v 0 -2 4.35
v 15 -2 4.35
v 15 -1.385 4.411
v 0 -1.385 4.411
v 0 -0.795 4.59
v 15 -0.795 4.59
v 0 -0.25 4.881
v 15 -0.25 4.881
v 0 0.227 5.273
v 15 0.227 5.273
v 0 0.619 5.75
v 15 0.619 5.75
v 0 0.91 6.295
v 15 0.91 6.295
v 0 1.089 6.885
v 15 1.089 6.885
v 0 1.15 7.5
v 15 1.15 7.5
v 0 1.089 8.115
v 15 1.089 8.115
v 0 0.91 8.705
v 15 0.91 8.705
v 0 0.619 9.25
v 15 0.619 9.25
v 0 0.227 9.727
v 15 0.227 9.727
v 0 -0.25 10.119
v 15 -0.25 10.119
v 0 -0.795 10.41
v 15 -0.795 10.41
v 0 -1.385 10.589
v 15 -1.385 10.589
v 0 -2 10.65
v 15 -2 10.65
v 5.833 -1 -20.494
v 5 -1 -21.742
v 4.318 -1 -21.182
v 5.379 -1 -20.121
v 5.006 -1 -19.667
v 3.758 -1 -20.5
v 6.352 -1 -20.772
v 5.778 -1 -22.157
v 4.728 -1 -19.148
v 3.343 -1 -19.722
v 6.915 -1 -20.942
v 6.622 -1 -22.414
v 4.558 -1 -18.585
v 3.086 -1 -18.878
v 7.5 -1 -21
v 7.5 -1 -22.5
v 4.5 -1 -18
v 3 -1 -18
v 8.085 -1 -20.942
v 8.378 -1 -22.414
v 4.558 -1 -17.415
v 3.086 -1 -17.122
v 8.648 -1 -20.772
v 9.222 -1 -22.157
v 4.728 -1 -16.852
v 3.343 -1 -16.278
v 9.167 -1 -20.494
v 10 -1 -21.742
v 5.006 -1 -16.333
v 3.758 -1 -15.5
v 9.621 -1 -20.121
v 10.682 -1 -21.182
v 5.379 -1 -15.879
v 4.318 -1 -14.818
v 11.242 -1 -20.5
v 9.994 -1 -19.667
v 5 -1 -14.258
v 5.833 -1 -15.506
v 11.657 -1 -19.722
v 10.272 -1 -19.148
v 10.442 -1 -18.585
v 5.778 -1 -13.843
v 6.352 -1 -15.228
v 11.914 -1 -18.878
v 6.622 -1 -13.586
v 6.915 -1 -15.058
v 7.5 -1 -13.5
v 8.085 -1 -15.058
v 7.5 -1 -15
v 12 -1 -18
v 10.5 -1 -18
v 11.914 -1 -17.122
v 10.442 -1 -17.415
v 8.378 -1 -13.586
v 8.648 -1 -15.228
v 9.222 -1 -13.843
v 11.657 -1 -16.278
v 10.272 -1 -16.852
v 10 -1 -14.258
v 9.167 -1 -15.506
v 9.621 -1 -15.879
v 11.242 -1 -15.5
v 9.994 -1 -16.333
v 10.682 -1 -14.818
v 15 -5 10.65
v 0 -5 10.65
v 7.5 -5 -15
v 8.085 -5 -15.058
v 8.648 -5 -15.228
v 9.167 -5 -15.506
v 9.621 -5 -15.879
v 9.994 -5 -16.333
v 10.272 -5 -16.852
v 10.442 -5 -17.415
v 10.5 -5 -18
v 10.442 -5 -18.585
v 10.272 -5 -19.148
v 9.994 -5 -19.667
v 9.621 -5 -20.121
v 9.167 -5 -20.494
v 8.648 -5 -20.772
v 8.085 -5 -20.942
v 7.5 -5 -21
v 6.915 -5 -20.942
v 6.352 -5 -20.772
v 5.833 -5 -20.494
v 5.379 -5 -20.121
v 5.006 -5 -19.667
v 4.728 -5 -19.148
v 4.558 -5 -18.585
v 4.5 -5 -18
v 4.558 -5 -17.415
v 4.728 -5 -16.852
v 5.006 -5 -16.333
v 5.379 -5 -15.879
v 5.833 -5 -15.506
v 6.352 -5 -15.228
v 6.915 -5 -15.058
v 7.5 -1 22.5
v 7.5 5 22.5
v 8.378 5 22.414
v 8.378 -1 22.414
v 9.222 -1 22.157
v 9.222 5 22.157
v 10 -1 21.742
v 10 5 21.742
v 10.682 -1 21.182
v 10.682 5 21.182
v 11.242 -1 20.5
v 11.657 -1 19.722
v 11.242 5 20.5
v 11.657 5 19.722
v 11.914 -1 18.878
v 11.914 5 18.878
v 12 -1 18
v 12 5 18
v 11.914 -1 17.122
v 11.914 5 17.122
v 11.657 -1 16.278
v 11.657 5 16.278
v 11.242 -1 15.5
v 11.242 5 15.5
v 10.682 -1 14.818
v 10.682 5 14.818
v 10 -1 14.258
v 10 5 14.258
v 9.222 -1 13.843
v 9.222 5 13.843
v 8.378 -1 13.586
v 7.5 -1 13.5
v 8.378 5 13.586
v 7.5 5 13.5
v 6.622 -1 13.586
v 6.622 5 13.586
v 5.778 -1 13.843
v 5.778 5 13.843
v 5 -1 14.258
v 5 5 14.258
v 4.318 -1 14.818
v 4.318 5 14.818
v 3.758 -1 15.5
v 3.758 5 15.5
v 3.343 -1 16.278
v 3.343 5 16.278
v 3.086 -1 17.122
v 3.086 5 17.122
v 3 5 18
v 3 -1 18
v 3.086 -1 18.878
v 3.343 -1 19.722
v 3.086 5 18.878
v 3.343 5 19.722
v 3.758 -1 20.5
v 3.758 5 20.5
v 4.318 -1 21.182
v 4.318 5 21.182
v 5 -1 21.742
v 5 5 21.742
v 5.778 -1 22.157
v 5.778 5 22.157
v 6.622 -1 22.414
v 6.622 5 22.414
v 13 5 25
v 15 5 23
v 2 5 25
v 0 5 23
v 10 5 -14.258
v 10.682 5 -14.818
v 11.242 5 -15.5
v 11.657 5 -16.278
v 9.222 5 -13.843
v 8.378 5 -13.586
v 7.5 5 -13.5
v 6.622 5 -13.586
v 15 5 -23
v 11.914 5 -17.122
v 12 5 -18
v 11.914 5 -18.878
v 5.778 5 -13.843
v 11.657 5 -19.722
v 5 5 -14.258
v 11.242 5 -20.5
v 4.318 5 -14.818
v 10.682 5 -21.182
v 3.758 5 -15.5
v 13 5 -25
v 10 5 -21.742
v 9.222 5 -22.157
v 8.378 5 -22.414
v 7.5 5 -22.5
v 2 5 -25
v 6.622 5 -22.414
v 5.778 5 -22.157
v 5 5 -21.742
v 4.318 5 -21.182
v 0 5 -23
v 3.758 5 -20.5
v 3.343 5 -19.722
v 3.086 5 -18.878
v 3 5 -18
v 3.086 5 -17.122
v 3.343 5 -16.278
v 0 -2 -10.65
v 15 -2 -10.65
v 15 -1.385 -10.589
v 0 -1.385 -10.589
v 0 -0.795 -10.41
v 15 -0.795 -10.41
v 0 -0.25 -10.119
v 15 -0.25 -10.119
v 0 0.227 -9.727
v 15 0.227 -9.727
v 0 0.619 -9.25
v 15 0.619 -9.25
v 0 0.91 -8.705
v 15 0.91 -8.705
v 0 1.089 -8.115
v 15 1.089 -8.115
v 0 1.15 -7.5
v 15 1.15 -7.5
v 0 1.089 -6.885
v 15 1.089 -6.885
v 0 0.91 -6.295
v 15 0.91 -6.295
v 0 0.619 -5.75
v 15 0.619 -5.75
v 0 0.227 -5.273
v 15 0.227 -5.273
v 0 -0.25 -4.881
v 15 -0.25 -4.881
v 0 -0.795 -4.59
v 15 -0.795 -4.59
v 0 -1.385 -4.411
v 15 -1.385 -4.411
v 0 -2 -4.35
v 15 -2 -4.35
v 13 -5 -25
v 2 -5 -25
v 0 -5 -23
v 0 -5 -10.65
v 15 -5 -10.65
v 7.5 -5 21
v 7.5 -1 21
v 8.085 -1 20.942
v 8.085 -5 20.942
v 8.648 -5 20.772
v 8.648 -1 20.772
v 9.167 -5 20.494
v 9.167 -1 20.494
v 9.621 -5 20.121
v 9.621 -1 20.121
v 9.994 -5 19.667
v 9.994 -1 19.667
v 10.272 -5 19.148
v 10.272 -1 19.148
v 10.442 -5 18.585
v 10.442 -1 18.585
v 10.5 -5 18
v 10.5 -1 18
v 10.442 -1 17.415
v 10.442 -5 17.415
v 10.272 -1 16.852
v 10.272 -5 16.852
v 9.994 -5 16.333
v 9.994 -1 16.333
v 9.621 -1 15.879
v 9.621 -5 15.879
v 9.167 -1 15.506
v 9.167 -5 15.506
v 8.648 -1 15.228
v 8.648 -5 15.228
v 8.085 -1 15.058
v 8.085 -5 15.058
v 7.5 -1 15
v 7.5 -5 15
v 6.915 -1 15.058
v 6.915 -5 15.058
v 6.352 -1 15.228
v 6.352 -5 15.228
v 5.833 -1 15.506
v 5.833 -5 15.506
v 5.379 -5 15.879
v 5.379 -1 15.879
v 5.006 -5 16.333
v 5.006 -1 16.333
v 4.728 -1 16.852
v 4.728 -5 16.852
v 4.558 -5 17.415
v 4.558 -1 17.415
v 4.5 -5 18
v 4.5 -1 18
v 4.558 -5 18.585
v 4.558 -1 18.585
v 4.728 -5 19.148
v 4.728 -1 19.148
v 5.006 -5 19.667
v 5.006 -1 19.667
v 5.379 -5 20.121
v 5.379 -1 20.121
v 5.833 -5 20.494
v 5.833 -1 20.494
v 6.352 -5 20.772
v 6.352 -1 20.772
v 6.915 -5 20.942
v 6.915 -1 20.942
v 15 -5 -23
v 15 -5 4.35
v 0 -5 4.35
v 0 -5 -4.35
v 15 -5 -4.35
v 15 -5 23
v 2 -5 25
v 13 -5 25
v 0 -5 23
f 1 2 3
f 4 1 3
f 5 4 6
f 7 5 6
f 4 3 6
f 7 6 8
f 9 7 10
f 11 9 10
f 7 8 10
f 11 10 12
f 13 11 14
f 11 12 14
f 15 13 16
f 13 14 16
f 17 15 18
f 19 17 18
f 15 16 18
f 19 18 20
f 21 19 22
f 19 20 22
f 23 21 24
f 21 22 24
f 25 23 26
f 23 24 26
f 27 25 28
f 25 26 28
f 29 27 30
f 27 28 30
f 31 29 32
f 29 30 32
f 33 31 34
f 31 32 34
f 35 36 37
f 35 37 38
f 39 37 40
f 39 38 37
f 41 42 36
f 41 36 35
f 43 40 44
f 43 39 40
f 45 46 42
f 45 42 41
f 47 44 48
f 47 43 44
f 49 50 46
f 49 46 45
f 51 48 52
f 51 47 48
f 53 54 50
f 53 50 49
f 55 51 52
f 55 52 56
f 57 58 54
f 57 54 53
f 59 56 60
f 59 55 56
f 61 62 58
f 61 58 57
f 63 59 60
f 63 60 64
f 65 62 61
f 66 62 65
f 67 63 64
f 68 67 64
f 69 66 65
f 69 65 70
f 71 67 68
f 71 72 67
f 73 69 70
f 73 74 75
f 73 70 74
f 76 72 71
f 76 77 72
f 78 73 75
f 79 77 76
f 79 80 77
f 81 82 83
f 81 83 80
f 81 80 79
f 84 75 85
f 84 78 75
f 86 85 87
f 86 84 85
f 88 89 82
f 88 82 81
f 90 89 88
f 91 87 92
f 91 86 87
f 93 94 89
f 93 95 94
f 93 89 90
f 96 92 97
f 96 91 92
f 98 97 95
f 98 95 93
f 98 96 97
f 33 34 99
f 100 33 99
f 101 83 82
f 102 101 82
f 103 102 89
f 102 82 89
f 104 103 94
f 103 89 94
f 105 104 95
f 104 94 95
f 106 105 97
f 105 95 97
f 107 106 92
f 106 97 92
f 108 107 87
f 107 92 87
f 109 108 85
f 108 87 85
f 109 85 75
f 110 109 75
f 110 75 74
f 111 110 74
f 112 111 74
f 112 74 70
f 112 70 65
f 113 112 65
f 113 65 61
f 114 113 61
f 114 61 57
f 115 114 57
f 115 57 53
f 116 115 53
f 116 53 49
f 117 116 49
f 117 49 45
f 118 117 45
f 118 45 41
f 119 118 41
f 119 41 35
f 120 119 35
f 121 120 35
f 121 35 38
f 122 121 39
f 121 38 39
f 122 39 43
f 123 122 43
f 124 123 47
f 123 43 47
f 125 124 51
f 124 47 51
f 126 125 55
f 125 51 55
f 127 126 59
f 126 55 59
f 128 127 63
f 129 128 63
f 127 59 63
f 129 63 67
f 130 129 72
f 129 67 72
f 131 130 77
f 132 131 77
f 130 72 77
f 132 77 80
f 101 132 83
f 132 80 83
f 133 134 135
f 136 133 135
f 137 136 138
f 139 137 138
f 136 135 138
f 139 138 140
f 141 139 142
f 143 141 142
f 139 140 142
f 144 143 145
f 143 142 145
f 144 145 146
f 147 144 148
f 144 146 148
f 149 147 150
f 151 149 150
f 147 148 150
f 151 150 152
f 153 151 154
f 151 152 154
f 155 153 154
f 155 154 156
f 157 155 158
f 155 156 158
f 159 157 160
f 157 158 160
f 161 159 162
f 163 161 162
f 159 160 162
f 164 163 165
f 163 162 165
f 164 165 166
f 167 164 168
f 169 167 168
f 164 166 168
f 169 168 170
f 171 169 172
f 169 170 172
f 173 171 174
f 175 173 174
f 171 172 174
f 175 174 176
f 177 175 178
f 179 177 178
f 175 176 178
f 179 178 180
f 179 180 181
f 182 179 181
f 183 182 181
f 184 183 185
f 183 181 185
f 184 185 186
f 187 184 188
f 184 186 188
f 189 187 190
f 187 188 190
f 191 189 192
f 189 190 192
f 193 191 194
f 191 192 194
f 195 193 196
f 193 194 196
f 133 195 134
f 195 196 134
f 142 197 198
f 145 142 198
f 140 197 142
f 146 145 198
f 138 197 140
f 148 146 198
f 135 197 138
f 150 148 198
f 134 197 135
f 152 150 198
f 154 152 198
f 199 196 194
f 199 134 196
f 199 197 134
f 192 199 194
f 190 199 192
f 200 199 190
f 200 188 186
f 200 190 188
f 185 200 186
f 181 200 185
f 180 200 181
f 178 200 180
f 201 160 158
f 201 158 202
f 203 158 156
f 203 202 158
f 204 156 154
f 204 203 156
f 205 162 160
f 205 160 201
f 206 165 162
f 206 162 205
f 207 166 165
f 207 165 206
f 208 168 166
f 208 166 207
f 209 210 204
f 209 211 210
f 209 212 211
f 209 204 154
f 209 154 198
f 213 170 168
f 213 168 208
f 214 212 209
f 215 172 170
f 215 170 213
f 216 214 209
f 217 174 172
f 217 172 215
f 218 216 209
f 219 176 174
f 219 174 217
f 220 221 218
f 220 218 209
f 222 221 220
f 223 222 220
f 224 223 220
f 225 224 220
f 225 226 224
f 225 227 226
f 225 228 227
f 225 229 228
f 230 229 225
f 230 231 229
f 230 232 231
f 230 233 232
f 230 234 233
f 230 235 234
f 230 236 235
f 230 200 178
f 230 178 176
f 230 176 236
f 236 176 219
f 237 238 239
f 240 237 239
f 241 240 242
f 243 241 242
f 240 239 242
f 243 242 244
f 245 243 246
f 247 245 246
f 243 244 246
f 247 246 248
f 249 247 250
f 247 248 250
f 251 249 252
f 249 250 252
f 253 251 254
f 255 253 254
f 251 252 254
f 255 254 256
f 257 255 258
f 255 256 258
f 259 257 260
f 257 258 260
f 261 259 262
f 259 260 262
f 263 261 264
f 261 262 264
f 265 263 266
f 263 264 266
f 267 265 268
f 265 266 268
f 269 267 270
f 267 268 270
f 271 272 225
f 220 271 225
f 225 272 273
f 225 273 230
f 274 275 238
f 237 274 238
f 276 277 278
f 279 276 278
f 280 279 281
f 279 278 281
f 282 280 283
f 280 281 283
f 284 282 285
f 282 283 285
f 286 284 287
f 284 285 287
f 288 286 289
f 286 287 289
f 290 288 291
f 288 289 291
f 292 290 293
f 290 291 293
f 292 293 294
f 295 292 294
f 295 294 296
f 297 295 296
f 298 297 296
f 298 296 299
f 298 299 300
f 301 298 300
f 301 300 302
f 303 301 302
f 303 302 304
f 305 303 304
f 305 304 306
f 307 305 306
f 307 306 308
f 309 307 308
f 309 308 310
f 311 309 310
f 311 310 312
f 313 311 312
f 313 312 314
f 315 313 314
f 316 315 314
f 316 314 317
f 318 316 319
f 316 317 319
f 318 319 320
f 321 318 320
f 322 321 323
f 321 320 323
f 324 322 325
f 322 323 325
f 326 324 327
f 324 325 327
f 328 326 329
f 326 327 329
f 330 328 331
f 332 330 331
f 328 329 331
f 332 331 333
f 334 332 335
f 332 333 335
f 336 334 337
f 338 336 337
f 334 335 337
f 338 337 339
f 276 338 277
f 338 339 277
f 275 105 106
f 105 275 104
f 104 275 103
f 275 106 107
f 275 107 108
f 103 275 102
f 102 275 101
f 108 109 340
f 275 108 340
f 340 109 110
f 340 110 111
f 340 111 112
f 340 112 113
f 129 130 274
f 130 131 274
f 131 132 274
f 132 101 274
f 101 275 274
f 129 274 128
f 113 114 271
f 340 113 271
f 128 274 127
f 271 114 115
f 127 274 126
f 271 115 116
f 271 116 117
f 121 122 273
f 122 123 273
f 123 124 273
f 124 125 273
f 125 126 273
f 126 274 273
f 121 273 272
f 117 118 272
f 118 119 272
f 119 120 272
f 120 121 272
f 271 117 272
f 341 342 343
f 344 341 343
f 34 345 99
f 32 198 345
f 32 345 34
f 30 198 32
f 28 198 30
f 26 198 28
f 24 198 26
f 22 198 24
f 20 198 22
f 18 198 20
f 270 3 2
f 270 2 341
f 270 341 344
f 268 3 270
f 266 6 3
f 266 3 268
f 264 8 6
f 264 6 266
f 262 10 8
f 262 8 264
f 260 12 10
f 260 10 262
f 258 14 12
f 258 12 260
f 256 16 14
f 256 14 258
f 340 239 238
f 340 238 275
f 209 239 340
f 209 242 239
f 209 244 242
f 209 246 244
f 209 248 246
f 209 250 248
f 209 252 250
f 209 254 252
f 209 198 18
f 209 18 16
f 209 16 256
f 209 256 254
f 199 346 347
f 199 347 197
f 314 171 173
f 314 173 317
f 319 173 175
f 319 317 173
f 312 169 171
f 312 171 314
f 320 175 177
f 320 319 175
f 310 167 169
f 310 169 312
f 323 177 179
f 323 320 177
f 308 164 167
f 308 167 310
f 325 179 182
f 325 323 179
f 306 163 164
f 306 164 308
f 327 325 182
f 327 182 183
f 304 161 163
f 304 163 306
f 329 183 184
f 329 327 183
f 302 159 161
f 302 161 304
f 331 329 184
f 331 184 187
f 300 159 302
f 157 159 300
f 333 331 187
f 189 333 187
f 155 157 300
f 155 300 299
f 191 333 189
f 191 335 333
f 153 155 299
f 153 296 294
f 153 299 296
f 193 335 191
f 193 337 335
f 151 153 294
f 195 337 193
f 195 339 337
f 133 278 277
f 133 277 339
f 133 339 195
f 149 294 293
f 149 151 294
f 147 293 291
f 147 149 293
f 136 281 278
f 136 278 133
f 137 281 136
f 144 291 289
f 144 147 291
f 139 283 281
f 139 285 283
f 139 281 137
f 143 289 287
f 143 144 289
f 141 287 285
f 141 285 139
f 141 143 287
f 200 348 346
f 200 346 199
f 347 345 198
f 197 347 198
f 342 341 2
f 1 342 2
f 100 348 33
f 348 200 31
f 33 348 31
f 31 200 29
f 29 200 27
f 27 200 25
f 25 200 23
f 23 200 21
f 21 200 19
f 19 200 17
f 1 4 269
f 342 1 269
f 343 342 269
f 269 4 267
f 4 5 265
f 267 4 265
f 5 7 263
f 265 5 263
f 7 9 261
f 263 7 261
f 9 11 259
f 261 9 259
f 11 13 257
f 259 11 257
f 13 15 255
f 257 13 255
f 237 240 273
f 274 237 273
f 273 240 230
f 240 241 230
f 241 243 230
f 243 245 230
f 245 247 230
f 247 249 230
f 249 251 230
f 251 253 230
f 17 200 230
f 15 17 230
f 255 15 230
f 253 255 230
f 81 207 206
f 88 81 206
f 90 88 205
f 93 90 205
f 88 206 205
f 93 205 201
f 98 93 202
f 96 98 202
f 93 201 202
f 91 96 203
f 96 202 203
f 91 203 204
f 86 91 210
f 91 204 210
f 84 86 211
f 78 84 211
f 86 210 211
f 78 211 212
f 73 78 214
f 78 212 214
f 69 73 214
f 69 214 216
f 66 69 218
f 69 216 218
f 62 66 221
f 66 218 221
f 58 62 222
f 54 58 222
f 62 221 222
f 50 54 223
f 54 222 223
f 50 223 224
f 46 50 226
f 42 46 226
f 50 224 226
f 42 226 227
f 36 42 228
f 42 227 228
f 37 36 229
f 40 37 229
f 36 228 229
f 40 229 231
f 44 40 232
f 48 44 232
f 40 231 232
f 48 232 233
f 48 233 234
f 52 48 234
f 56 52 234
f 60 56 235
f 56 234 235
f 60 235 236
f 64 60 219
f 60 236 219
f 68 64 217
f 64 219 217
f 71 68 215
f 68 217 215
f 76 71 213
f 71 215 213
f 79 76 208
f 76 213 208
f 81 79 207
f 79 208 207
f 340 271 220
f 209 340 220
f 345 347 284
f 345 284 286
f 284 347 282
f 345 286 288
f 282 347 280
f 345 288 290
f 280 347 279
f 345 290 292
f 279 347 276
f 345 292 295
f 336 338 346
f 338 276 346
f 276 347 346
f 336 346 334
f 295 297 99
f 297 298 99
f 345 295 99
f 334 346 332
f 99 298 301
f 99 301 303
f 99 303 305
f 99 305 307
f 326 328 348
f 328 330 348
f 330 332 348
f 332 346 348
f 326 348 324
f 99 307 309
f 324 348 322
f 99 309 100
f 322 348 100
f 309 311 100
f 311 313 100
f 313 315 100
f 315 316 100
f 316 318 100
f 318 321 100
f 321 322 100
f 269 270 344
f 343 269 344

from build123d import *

# Parameters (mm, degrees)
SKETCH1_W           = 50
SKETCH1_H           = 10
BOSS_EXTRUDE1_DEPTH = 15
SKETCH3_R           = 4.5
CUT_EXTRUDE1_DEPTH  = 6
SKETCH4_R           = 3
CUT_EXTRUDE2_DEPTH  = 6
CUT_EXTRUDE3_DEPTH  = 30.580398915
CHAMFER1_SIZE       = 2


with BuildPart() as part:
    # Sketch1 → Boss-Extrude1 (new body)
    with BuildSketch(Plane(origin=(0, 0, 0), x_dir=(0, 0, -1), z_dir=(1, 0, 0))):
        Rectangle(SKETCH1_W, SKETCH1_H)
    extrude(amount=BOSS_EXTRUDE1_DEPTH)

    # Sketch3 → Cut-Extrude1 (cut)
    with BuildSketch(Plane(origin=(0, 5, 0), x_dir=(1, 0, 0), z_dir=(0, 1, 0))):
        with Locations(Location((7.5, -18, 0), (0, 0, 270))):
            Circle(SKETCH3_R)
        with Locations(Location((7.5, 18, 0), (0, 0, 270))):
            Circle(SKETCH3_R)
    extrude(amount=-CUT_EXTRUDE1_DEPTH, mode=Mode.SUBTRACT)

    # Sketch4 → Cut-Extrude2 (cut)
    with BuildSketch(Plane(origin=(0, -1, 0), x_dir=(1, 0, 0), z_dir=(0, 1, 0))):
        with Locations(Location((7.5, 18, 0), (0, 0, 270))):
            Circle(SKETCH4_R)
        with Locations(Location((7.5, -18, 0), (0, 0, 270))):
            Circle(SKETCH4_R)
    extrude(amount=-CUT_EXTRUDE2_DEPTH, mode=Mode.SUBTRACT)

    # Sketch5 → Cut-Extrude3 (cut, through all)
    with BuildSketch(Plane(origin=(15, 0, 0), x_dir=(0, 0, -1), z_dir=(1, 0, 0))):
        with BuildLine():
            Line((-4.35, -2), (-10.65, -2))
            ThreePointArc((-10.65, -2), (-10.04440329, -3.857016936), (-8.460468636, -5))
            Line((-8.460468636, -5), (-6.539531364, -5))
            ThreePointArc((-6.539531364, -5), (-4.95559671, -3.857016936), (-4.35, -2))
        make_face()
        with BuildLine():
            ThreePointArc((-4.35, -2), (-7.5, 1.15), (-10.65, -2))
            Line((-10.65, -2), (-4.35, -2))
        make_face()
        with BuildLine():
            Line((-8.460468636, -5), (-10.65, -5))
            Line((-10.65, -5), (-10.65, -9.185427258))
            Line((-10.65, -9.185427258), (-4.35, -9.185427258))
            Line((-4.35, -9.185427258), (-4.35, -5))
            Line((-4.35, -5), (-6.539531364, -5))
            ThreePointArc((-6.539531364, -5), (-7.5, -5.15), (-8.460468636, -5))
        make_face()
        with BuildLine():
            ThreePointArc((-8.460468636, -5), (-10.04440329, -3.857016936), (-10.65, -2))
            Line((-10.65, -2), (-10.65, -5))
            Line((-10.65, -5), (-8.460468636, -5))
        make_face()
        with BuildLine():
            Line((-4.35, -5), (-4.35, -2))
            ThreePointArc((-4.35, -2), (-4.95559671, -3.857016936), (-6.539531364, -5))
            Line((-6.539531364, -5), (-4.35, -5))
        make_face()
        with BuildLine():
            Line((4.35, -2), (4.35, -5))
            Line((4.35, -5), (6.539531364, -5))
            ThreePointArc((6.539531364, -5), (4.95559671, -3.857016936), (4.35, -2))
        make_face()
        with BuildLine():
            Line((10.65, -2), (4.35, -2))
            ThreePointArc((4.35, -2), (4.95559671, -3.857016936), (6.539531364, -5))
            Line((6.539531364, -5), (8.460468636, -5))
            ThreePointArc((8.460468636, -5), (10.04440329, -3.857016936), (10.65, -2))
        make_face()
        with BuildLine():
            ThreePointArc((10.65, -2), (7.5, 1.15), (4.35, -2))
            Line((4.35, -2), (10.65, -2))
        make_face()
        with BuildLine():
            Line((10.65, -5), (10.65, -2))
            ThreePointArc((10.65, -2), (10.04440329, -3.857016936), (8.460468636, -5))
            Line((8.460468636, -5), (10.65, -5))
        make_face()
    extrude(amount=-CUT_EXTRUDE3_DEPTH, mode=Mode.SUBTRACT)

    # Chamfer1
    chamfer1_edges = [part.edges().sort_by_distance(p)[0] for p in [
        (15, 0, 25),
        (15, 0, -25),
        (0, 0, 25),
        (0, 0, -25),
    ]]
    chamfer(chamfer1_edges, length=CHAMFER1_SIZE)


solid = part.part
